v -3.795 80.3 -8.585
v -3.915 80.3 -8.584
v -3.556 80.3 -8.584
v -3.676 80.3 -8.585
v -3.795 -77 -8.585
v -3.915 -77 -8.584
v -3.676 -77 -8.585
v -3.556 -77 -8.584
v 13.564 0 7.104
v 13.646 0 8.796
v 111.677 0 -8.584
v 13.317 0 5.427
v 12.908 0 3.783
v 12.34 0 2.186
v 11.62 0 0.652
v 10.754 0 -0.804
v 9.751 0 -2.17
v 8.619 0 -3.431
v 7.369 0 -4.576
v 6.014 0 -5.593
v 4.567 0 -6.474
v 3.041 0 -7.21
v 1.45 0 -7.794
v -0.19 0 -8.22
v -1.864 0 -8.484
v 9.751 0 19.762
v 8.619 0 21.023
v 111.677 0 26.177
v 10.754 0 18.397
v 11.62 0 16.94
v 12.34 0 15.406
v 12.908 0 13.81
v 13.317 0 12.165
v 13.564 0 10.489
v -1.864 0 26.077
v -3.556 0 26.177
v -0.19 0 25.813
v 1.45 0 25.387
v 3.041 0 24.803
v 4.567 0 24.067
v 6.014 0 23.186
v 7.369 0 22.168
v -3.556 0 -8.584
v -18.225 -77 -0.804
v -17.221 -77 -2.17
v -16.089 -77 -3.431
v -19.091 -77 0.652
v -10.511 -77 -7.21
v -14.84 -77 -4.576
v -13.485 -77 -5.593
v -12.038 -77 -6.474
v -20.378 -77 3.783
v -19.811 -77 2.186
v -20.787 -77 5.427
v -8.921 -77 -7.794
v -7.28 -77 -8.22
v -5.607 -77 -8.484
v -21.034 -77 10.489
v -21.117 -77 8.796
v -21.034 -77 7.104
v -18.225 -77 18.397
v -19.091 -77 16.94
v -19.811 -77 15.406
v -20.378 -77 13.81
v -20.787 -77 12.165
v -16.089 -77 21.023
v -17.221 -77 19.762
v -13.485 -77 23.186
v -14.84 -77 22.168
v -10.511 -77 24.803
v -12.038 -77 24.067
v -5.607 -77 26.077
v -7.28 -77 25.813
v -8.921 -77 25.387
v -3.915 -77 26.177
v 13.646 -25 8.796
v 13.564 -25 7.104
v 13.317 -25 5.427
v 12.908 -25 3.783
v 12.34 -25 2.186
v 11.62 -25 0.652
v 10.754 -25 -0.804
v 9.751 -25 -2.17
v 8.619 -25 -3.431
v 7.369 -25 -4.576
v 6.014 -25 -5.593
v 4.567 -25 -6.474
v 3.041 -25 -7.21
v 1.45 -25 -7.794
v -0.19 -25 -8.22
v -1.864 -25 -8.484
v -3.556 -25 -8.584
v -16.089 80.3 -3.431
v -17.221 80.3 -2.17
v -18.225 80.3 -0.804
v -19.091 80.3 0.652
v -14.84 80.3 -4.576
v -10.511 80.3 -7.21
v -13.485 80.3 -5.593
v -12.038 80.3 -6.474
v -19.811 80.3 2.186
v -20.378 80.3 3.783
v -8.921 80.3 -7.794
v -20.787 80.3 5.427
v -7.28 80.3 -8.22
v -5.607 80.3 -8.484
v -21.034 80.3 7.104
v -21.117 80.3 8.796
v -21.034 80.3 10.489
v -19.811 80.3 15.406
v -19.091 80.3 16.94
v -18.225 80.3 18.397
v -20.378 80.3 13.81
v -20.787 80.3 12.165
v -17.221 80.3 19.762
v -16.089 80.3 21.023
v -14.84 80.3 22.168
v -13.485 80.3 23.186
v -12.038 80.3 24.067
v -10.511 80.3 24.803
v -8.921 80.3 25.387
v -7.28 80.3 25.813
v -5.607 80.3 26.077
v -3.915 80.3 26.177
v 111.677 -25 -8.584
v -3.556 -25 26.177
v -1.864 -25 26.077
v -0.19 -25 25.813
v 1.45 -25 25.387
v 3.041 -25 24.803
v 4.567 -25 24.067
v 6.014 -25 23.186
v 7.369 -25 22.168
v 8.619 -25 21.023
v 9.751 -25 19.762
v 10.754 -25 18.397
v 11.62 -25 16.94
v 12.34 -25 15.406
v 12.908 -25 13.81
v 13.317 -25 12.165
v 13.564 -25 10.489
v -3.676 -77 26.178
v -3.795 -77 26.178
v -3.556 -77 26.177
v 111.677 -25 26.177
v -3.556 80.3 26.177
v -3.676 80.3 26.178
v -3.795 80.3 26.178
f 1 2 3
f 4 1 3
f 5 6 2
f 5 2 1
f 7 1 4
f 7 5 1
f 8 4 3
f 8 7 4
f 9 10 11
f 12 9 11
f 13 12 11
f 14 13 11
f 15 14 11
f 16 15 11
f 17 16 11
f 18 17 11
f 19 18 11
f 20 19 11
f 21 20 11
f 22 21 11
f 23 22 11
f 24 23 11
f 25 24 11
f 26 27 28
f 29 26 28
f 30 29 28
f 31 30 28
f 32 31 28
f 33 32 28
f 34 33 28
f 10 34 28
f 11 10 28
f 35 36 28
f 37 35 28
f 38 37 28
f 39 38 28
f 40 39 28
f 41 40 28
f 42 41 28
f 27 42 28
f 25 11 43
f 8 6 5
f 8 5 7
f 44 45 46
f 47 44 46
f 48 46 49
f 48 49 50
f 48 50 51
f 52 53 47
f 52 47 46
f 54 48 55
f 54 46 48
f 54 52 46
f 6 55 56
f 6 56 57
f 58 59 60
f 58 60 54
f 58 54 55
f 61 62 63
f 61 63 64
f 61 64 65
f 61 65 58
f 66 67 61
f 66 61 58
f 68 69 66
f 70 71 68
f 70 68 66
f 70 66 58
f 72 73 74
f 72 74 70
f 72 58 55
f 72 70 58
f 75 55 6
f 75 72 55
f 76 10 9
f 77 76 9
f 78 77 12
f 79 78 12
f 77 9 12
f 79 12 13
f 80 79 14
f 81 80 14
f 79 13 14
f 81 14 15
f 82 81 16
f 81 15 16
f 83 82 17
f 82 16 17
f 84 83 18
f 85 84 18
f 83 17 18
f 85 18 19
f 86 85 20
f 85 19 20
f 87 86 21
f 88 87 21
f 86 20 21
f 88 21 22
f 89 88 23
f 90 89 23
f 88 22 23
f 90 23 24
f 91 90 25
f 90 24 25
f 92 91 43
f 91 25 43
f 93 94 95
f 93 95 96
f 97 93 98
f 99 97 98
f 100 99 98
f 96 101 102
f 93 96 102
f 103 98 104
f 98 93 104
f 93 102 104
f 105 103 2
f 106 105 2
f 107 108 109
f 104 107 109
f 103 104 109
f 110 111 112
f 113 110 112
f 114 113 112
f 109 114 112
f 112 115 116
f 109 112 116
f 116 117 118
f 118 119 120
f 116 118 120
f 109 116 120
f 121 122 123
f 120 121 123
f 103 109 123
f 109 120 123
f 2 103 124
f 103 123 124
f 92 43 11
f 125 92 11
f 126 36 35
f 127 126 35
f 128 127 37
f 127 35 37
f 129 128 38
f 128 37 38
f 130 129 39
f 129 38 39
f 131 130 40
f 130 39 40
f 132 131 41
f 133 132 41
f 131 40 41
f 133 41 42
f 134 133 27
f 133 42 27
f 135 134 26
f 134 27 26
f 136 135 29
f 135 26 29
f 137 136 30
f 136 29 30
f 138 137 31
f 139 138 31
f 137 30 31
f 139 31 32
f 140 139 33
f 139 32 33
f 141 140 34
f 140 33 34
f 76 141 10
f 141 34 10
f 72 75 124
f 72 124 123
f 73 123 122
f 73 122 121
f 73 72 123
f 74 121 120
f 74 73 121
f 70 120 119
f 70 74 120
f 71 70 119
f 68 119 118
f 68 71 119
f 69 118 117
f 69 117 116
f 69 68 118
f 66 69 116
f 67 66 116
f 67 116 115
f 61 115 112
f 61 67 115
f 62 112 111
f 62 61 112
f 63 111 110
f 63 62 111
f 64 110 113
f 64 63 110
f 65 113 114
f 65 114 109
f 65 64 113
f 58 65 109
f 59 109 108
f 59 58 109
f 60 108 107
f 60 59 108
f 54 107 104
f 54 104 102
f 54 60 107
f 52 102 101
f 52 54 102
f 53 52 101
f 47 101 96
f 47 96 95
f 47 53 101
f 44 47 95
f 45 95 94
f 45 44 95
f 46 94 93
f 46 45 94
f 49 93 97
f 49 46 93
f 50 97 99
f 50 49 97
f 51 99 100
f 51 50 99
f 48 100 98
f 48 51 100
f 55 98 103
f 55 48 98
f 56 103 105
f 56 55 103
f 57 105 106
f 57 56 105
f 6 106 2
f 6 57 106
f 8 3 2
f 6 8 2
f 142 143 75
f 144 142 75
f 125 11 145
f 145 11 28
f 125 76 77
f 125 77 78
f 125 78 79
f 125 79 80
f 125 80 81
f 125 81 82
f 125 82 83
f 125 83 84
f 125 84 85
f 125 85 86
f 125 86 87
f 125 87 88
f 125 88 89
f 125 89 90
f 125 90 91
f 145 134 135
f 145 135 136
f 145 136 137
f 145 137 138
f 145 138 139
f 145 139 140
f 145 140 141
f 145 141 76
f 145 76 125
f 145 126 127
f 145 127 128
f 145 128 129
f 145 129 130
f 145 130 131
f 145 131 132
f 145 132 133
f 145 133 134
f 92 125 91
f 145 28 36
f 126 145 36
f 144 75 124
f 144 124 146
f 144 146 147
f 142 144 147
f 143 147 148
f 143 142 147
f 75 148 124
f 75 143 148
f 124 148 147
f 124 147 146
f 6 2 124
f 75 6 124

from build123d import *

# Parameters (mm, degrees)
F1_DEPTH      = 77
F1_DEPTH_BACK = 80.3
F2_DEPTH      = 25


with BuildPart() as f1:
    # F0 (on Front) → F1 (new body, two sides)
    with BuildSketch(Plane.XZ) as f1_sk:
        with BuildLine():
            Line((-3.9150179645, -8.5844577717), (-3.9150179645, 26.1770182716))
            ThreePointArc((-3.9150179645, 26.1770182716), (-21.1170714481, 8.79628025), (-3.9150179645, -8.5844577717))
        make_face()
    extrude(amount=F1_DEPTH)
    extrude(f1_sk.sketch, amount=-F1_DEPTH_BACK)


with BuildPart() as f1b:
    # F0 (on Front) → F1, piece 2 (new body, two sides)
    with BuildSketch(Plane.XZ) as f1_2_sk:
        with BuildLine():
            ThreePointArc((-3.5557928214, 26.1770182716), (-3.7354053929, 26.1779463051), (-3.9150179645, 26.1770182716))
            Line((-3.9150179645, 26.1770182716), (-3.5557928214, 26.1770182716))
        make_face()
    extrude(amount=F1_DEPTH)
    extrude(f1_2_sk.sketch, amount=-F1_DEPTH_BACK)


with BuildPart() as f1c:
    # F0 (on Front) → F1, piece 3 (new body, two sides)
    with BuildSketch(Plane.XZ) as f1_3_sk:
        with BuildLine():
            Line((-3.5557928214, -8.5844577717), (-3.9150179645, -8.5844577717))
            ThreePointArc((-3.9150179645, -8.5844577717), (-3.7354053929, -8.5853858052), (-3.5557928214, -8.5844577717))
        make_face()
    extrude(amount=F1_DEPTH)
    extrude(f1_3_sk.sketch, amount=-F1_DEPTH_BACK)


with BuildPart() as f2:
    # F0 (on Front) → F2 (new body)
    with BuildSketch(Plane.XZ):
        with BuildLine():
            Line((111.6774268448, 26.1770182716), (-3.5557928214, 26.1770182716))
            ThreePointArc((-3.5557928214, 26.1770182716), (8.6186279685, 21.0233066488), (13.6462606622, 8.79628025))
            ThreePointArc((13.6462606622, 8.79628025), (8.6186279685, -3.4307461489), (-3.5557928214, -8.5844577717))
            Line((-3.5557928214, -8.5844577717), (111.6774268448, -8.5844577717))
            Line((111.6774268448, -8.5844577717), (111.6774268448, 26.1770182716))
        make_face()
    extrude(amount=F2_DEPTH)


solid = Compound([f1.part, f1b.part, f1c.part, f2.part])
